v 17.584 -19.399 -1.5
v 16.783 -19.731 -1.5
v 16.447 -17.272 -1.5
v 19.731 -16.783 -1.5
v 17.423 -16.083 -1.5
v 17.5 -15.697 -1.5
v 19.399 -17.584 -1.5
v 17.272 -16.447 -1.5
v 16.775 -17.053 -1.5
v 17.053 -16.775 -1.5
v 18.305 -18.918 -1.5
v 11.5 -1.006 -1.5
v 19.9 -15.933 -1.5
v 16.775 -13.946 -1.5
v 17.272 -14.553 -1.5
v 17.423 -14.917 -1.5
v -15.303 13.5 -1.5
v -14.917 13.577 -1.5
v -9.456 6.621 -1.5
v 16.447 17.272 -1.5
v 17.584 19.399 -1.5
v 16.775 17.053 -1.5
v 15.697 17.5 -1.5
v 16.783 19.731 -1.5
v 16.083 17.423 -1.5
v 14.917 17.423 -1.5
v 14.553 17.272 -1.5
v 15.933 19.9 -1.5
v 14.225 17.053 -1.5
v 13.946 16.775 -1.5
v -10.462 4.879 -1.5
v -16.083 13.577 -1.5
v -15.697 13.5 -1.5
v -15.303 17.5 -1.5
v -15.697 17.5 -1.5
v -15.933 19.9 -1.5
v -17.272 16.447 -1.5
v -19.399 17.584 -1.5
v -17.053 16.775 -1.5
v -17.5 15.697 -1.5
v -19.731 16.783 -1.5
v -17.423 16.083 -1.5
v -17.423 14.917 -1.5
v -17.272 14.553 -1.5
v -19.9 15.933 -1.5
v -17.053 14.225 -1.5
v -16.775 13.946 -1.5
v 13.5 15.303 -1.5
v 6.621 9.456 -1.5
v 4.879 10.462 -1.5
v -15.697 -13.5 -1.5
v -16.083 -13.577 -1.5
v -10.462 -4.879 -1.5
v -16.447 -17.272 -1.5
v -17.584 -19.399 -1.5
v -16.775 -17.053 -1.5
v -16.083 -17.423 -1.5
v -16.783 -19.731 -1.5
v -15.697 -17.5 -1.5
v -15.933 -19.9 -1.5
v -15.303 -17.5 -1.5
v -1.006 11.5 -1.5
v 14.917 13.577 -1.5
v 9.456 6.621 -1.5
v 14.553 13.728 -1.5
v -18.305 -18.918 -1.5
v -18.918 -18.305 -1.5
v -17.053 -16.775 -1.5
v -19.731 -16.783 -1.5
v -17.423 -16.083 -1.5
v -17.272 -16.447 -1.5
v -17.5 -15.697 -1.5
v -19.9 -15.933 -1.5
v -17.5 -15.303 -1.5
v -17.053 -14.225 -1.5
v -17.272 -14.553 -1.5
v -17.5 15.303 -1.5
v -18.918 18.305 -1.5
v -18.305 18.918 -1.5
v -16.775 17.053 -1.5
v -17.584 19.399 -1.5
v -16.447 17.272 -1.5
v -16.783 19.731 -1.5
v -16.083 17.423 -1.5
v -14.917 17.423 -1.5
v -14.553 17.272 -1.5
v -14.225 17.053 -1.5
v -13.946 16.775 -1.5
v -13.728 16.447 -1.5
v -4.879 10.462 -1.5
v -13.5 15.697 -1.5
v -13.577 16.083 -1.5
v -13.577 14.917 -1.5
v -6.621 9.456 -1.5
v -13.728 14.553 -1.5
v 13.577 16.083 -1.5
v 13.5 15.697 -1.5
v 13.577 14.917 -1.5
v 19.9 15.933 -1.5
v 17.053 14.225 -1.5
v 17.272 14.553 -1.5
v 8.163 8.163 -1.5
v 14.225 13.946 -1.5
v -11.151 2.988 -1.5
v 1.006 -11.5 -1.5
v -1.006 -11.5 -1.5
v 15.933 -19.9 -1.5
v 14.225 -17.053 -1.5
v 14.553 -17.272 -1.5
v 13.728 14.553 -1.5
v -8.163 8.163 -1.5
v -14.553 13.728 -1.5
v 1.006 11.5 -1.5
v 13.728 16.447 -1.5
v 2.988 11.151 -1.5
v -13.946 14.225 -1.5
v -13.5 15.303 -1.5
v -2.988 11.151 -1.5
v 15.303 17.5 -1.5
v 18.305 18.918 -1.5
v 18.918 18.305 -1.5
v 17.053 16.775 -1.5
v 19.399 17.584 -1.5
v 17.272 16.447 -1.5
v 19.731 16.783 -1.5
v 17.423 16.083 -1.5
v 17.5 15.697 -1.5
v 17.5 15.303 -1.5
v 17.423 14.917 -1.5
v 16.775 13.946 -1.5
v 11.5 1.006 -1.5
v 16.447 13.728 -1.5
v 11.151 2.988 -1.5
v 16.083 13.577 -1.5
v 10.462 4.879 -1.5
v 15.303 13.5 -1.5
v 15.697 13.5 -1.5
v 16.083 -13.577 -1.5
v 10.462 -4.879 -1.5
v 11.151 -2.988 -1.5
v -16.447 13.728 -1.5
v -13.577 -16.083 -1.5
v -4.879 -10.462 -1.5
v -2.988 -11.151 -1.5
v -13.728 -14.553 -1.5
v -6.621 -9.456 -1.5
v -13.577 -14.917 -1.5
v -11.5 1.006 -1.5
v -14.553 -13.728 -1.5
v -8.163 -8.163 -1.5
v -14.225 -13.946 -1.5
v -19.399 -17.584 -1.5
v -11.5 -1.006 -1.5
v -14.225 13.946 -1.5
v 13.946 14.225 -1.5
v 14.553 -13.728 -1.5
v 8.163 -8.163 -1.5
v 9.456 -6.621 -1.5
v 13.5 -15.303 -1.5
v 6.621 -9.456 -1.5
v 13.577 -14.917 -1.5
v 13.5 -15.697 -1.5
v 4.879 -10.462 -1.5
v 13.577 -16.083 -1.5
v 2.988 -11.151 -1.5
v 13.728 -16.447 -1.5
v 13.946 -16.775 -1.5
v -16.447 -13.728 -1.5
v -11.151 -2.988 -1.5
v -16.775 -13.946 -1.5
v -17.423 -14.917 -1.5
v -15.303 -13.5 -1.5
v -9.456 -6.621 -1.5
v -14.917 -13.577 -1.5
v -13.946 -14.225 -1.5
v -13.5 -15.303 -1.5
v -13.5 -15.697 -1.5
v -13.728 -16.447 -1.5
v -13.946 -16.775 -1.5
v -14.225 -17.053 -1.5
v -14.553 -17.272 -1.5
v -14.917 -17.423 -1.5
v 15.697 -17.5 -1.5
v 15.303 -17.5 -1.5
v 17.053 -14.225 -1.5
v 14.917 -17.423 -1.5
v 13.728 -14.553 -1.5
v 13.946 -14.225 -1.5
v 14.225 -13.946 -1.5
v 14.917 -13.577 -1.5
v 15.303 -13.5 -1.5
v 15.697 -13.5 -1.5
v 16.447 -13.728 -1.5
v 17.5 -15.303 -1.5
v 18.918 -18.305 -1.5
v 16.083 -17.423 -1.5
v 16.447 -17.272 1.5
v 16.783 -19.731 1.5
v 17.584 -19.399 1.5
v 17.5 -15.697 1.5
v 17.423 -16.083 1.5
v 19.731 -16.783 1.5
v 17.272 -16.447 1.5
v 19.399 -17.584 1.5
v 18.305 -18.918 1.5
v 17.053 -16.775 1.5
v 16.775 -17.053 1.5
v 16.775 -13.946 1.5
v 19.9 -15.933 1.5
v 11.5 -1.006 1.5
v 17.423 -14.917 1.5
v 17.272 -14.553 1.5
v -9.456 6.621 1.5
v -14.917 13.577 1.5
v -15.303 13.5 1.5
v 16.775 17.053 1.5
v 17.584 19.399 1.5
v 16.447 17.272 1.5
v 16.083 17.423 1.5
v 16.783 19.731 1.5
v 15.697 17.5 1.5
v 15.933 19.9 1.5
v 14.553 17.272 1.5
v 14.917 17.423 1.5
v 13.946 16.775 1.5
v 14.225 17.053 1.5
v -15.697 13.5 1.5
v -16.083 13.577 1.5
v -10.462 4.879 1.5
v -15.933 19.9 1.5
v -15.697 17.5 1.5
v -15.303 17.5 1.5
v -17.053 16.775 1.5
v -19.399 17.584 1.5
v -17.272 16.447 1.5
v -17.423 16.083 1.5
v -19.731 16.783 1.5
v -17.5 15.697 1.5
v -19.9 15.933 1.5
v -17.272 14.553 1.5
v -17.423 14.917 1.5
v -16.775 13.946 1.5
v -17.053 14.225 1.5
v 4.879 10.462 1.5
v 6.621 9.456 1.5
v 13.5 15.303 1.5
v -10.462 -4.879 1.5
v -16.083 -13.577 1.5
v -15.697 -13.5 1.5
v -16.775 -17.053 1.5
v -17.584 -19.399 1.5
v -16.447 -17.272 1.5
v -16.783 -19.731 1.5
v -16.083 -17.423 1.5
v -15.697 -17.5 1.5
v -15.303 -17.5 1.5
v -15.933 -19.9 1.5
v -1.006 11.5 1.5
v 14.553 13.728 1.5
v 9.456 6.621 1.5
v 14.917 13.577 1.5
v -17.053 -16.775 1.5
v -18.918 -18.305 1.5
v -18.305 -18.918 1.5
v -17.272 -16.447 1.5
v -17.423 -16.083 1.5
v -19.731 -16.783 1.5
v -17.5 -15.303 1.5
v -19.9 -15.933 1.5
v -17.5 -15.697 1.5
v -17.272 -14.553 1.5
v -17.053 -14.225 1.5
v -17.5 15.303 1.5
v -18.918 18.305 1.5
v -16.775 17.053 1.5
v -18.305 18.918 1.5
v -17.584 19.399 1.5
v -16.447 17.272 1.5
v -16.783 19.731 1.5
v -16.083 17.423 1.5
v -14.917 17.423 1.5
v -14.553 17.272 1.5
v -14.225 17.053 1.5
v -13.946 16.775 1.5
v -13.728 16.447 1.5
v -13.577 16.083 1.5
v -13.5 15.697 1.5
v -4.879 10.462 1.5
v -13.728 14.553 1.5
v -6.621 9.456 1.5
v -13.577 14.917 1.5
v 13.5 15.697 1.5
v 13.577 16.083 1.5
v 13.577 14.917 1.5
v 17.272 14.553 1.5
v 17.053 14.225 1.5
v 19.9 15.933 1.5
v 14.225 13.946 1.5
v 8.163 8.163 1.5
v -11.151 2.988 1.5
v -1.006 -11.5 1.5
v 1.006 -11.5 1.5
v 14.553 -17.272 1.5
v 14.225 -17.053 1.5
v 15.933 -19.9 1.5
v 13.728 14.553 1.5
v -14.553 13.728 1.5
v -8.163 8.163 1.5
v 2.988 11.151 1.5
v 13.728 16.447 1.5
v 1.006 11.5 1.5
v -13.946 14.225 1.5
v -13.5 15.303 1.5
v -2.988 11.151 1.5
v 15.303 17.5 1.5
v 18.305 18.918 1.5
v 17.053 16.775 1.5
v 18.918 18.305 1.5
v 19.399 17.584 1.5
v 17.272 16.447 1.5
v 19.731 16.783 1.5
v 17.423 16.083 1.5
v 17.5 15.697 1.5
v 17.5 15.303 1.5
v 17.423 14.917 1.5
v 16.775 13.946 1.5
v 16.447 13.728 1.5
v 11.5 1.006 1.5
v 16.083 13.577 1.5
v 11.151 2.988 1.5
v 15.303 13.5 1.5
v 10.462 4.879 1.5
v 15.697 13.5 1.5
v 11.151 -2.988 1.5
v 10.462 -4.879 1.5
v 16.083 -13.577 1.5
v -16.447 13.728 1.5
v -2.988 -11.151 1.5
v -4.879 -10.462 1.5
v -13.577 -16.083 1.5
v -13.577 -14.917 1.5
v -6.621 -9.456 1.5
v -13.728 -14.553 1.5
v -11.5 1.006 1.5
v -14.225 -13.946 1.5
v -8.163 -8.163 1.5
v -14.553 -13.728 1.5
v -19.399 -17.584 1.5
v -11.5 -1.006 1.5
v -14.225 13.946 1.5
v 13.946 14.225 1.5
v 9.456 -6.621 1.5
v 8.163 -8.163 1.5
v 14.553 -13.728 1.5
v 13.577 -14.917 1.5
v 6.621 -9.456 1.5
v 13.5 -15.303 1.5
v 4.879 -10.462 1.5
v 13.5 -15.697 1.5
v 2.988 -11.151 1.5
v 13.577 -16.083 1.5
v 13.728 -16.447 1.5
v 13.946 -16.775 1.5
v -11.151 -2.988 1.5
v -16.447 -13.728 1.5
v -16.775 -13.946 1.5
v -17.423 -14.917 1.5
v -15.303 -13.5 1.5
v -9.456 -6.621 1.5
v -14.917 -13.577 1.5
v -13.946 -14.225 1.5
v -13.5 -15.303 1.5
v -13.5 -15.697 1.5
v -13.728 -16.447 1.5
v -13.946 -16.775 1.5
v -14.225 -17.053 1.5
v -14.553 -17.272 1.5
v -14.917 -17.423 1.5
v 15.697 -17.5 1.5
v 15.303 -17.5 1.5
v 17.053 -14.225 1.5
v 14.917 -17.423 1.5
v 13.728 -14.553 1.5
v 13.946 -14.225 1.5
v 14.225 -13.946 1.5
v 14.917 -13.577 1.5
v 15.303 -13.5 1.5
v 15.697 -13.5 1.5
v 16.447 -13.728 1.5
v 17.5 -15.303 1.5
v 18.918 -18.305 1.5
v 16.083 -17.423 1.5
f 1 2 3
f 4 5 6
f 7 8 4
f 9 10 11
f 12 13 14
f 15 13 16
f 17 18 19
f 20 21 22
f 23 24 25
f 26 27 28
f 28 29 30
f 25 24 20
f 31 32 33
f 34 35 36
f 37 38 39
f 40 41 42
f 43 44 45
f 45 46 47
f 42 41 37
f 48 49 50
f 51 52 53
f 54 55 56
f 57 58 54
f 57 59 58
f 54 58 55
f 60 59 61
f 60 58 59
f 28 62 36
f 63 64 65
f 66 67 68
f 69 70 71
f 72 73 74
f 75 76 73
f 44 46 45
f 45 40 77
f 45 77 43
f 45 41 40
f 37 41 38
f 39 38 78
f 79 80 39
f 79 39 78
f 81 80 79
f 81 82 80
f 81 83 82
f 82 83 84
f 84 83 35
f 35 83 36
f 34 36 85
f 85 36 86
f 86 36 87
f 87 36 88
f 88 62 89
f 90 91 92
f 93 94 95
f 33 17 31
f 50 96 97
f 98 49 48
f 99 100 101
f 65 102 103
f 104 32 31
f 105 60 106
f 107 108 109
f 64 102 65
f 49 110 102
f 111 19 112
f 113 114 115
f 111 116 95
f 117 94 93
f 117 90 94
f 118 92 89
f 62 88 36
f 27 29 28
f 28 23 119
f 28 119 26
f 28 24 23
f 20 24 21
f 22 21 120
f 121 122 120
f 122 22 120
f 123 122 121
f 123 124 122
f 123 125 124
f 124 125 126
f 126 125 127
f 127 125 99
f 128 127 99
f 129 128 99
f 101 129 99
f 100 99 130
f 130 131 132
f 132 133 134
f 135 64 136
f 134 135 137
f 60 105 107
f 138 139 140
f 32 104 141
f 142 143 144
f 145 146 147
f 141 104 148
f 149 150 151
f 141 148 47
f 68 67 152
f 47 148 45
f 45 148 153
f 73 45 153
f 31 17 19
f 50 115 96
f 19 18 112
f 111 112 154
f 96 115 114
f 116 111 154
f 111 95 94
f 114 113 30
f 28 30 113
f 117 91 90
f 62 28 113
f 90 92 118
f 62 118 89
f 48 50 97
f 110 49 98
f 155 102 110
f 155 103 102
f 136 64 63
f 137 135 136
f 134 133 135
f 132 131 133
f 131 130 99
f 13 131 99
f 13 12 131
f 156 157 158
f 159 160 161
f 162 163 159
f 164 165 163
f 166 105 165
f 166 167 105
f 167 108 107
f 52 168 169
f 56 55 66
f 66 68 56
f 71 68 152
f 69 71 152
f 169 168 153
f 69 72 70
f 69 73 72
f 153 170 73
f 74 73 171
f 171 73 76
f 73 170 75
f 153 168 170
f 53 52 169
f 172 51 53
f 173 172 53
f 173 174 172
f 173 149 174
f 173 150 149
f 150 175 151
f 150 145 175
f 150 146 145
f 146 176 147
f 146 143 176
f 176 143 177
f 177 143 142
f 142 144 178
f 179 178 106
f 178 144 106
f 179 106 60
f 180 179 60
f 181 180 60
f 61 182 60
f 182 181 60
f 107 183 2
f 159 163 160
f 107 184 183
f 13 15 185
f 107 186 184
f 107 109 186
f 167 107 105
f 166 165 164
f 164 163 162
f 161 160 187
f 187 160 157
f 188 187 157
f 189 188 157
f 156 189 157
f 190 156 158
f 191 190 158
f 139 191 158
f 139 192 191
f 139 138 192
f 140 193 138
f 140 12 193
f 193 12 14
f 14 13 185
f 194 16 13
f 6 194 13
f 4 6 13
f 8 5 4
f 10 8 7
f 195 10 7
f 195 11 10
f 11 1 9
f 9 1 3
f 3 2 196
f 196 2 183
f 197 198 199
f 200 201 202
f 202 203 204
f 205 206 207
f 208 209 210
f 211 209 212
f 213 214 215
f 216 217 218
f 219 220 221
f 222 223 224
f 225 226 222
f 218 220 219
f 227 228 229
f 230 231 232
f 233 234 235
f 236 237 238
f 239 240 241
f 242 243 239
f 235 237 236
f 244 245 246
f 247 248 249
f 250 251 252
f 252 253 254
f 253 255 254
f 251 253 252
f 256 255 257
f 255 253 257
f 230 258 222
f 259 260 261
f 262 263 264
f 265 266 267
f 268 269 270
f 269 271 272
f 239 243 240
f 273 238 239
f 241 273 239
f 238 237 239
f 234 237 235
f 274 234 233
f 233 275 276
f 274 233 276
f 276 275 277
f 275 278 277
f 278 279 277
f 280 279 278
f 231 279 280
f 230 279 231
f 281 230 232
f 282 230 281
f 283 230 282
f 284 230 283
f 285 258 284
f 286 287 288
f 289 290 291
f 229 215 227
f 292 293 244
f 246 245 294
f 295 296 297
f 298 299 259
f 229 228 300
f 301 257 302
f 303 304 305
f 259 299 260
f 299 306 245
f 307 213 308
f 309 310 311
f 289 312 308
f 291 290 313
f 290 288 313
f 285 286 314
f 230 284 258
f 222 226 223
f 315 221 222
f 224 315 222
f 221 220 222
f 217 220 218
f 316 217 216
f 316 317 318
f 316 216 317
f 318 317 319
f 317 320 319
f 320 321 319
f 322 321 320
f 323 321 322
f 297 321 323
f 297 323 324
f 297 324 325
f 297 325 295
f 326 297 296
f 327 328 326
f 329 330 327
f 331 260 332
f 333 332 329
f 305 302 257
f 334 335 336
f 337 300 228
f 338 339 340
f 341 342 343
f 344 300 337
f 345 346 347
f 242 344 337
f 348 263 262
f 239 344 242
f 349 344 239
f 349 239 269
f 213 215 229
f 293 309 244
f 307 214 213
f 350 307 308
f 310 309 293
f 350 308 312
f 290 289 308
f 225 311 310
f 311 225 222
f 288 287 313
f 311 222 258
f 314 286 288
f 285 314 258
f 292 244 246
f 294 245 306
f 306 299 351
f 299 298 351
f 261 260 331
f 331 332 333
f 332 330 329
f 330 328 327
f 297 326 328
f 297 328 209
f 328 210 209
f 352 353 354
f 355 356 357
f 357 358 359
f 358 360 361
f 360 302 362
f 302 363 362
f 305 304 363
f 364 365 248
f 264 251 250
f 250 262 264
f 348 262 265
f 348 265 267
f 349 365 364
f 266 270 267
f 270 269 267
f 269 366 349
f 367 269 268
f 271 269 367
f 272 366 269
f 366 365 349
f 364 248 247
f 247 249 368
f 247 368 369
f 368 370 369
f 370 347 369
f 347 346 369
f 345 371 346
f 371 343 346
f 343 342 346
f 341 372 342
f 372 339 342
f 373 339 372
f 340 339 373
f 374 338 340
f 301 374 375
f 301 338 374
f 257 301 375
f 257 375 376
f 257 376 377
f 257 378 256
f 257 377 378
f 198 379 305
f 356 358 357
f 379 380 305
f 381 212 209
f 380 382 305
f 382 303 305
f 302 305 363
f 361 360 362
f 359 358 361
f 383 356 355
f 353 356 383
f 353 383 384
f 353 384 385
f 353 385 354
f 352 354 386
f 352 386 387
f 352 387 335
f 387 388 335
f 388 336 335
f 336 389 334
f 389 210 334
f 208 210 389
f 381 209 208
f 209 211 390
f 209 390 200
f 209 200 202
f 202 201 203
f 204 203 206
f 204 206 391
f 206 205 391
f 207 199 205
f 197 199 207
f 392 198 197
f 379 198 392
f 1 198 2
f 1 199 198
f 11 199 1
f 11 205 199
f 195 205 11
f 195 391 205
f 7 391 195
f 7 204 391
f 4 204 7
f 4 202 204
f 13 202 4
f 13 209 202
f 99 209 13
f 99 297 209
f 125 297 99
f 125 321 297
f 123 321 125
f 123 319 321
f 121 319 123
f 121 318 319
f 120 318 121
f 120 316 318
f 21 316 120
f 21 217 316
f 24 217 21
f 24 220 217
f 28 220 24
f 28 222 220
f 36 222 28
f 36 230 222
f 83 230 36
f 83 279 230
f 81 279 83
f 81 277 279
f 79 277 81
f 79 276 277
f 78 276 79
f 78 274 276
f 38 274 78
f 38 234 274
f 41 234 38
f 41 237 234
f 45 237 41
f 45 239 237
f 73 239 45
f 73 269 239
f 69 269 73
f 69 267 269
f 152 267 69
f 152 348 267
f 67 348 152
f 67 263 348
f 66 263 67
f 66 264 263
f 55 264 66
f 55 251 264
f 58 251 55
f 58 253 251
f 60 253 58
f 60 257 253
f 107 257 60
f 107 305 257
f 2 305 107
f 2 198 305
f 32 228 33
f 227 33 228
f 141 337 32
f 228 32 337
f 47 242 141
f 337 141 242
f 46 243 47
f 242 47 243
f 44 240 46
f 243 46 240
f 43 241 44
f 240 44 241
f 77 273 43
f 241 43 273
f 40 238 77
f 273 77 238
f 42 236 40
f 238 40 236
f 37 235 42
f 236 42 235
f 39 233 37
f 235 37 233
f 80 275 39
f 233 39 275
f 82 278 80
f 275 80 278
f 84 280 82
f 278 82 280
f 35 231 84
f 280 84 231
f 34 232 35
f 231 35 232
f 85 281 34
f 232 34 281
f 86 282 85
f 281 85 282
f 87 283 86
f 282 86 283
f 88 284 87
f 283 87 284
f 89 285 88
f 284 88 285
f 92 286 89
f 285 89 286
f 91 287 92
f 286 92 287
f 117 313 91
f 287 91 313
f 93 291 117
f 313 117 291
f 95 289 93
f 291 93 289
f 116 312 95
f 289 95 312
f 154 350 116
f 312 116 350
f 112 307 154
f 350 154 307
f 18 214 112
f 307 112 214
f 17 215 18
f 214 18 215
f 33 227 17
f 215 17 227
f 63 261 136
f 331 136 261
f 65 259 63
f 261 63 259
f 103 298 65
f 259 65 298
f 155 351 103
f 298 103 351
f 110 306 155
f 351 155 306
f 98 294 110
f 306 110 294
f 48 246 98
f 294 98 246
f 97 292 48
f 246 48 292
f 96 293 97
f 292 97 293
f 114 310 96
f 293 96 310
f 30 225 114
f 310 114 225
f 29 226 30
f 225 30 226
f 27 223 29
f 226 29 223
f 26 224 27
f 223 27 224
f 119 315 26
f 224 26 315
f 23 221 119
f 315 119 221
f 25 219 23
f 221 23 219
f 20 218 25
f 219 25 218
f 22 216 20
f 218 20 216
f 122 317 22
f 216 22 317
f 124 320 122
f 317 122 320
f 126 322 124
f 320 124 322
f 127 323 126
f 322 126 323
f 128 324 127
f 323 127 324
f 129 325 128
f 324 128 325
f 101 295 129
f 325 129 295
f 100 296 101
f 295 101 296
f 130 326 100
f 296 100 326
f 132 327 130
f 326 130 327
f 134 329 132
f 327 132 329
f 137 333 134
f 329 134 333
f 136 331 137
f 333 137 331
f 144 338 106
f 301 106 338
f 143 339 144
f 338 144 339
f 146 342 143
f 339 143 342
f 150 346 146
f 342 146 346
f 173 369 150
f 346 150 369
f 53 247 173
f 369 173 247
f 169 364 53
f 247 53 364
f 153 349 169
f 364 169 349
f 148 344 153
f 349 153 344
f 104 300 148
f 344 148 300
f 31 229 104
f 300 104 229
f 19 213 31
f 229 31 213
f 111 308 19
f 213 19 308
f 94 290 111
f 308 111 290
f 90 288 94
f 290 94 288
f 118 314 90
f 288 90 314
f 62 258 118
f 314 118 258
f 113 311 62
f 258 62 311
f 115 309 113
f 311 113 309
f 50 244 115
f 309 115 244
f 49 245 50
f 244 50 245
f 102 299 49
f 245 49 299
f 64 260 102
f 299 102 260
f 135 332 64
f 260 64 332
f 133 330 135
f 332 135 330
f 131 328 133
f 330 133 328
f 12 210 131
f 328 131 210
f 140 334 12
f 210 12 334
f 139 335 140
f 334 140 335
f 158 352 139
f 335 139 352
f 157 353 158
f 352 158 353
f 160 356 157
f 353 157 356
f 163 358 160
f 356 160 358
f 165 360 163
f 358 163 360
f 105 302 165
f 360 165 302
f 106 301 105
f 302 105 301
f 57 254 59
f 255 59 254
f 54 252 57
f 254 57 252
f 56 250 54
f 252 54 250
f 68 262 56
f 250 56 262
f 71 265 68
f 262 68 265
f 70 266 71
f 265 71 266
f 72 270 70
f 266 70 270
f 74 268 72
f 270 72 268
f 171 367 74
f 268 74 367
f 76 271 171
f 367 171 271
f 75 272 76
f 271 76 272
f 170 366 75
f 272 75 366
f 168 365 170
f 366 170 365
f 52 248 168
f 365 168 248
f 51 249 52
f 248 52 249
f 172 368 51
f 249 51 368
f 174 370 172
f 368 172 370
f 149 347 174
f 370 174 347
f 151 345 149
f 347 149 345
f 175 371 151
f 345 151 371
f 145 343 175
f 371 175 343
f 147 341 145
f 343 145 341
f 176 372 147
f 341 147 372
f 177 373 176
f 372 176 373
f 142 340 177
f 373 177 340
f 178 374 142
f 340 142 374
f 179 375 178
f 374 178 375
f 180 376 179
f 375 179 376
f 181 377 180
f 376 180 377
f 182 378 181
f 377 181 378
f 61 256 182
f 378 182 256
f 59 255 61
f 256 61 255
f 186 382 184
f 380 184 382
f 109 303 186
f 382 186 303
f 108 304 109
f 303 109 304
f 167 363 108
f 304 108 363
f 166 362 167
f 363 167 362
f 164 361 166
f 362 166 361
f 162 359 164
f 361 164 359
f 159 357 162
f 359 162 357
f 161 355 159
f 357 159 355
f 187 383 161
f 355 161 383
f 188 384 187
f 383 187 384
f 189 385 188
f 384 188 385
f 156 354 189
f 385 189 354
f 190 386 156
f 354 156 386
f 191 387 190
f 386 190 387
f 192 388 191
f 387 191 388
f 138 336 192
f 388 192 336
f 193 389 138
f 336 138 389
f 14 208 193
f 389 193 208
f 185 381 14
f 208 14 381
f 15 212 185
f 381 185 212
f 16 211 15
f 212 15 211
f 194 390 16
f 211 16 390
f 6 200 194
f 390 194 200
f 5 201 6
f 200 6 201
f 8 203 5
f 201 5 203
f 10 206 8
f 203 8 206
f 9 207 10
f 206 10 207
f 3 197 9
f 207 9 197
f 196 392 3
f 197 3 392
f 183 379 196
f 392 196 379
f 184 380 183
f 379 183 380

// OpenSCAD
// file: lib/util.scad
resolution = 32;

left = -1;
right = 1;
top = 1;
bottom = -1;
rear = 1;
front = -1;

function accurate_diam(diam,sides) = 1 / cos(180/sides) / 2 * diam;

module hole(diam,len,sides=8) {
  rotate([0,0,180/sides]) {
    cylinder(r=accurate_diam(diam,sides),h=len,center=true,$fn=sides);
  }
}

module accurate_circle(diam,sides=8) {
  rotate([0,0,180/sides]) {
    circle(r=accurate_diam(diam,sides),$fn=sides);
  }
}

module debug_axes() {
  color("red") translate([50,0,0]) cube([100,.2,.2],center=true);
  color("green") translate([0,50,0]) cube([.2,100,.2],center=true);
  color("blue") translate([0,0,50]) cube([.2,.2,100],center=true);
}

module ring(id,thickness,height,fn=16) {
  od = id + thickness;
  linear_extrude(height=height,center=true) {
    difference() {
      accurate_circle(od,fn);
      accurate_circle(id,fn);
    }
  }
}

module rounded_square(width,depth,diam,fn=resolution) {
  pos_x = width/2-diam/2;
  pos_y = depth/2-diam/2;

  hull() {
    for(x=[left,right]) {
      for(y=[front,rear]) {
        translate([x*pos_x,y*pos_y,0]) {
          accurate_circle(diam,fn);
        }
      }
    }
  }
}

module rounded_cube(width,depth,height,diam,fn=resolution) {
  linear_extrude(height=height,center=true,convexity=3) {
    rounded_square(width,depth,diam,fn);
  }
}

module round_corner_filler(diam,length) {
  linear_extrude(height=length,center=true,convexity=3) {
    round_corner_filler_profile(diam);
  }
}

module round_corner_filler_profile(diam,res=resolution) {
  difference() {
    translate([diam/4,diam/4,0]) {
      square([diam/2,diam/2],center=true);
    }
    translate([diam/2,diam/2,0]) {
      accurate_circle(diam,res);
    }
  }
}

module space_along_length(length,min_hole_spacing=4*inch,from_end=1*inch) {
  avail_length = length - (from_end*2);
  num_spaces   = floor(avail_length / min_hole_spacing);
  extra_space  = (avail_length - (num_spaces*min_hole_spacing)) / num_spaces;
  spacing      = min_hole_spacing + extra_space;

  // echo(length, num_spaces, spacing);

  translate([0,-length/2+from_end,0]) {
    for(y=[0:num_spaces]) {
      translate([0,y*spacing,0]) {
        children();
      }
    }
  }
}

module letter_spike(thin_width,thick_width,thickness) {
  hull() {
    cylinder(r=thin_width,h=thickness*2,center=true,$fn=16);
    cylinder(r=thick_width,h=0.01,center=true,$fn=16);
  }
}

module letter_L(width=10,height=20,thickness=0.5,thick_width=2,thin_width=0.3) {
  lines = [
    [
      [-width/2,height/2,0],
      [-width/2,-height/2,0],
    ],
    [
      [-width/2,-height/2,0],
      [width/2,-height/2,0],
    ],
  ];

  for(pair=lines) {
    hull() {
      for(vect=pair) {
        translate(vect) {
          letter_spike(thin_width,thick_width,thickness);
        }
      }
    }
  }
}

module letter_R(width=10,height=20,thickness=0.5,thick_width=2,thin_width=0.3) {
  lines = [
    [
      [-width/2,height/2,0],
      [-width/2,-height/2,0],
    ],
    [
      [-width/2,height/2,0],
      [width/2,height/3,0],
    ],
    [
      [width/2,height/3,0],
      [-width/4,0,0],
    ],
    [
      [-width/2,0,0],
      [-width/4,0,0],
    ],
    [
      [-width/4,0,0],
      [width/2,-height/2,0],
    ],
  ];

  for(pair=lines) {
    hull() {
      for(vect=pair) {
        translate(vect) {
          letter_spike(thin_width,thick_width,thickness);
        }
      }
    }
  }
}

module zip_tie_cavity(inner_diam_input,zip_tie_thickness,zip_tie_width,fn=resolution) {
  inner_diam = inner_diam_input -0.05;
  overall_width = inner_diam+zip_tie_thickness*2;

  module profile() {
    for(x=[left,right]) {
      translate([x*(inner_diam/2+zip_tie_thickness/2),overall_width,0]) {
        square([zip_tie_thickness,overall_width*2],center=true);
      }
    }

    intersection() {
      translate([0,-overall_width,0]) {
        square([overall_width*2,overall_width*2],center=true);
      }
      difference() {
        accurate_circle(inner_diam+zip_tie_thickness*2,fn);
        accurate_circle(inner_diam,fn);
      }
    }
  }

  linear_extrude(height=zip_tie_width,convexity=3,center=true) {
    profile();
  }
}

module printed_extrusion_carriage_profile(body_width,body_height) {
  spring_thickness = extrude_width*4;
  spring_gap_width = 1;
  preload = -0.2; // negative makes more slack both for print and UHMWPE tape
  wall_thickness = extrude_width*4;

  cavity_width = body_width - wall_thickness*4;
  cavity_height = body_height - wall_thickness*4;

  module spring_profile() {
    contact_width = 8;

    translate([0,-preload+spring_thickness/2]) {
      translate([left*(y_rail_extrusion_width/2-contact_width/2),0,0]) {
        rounded_square(contact_width,spring_thickness,spring_thickness);
      }
      hull() {
        translate([left*(y_rail_extrusion_width/2-contact_width+spring_thickness/2),0,0]) {
          accurate_circle(spring_thickness,resolution);
        }
        translate([right*(y_rail_extrusion_width/2-spring_thickness),spring_gap_width/2,0]) {
          accurate_circle(spring_thickness,resolution);
        }
      }
      translate([right*(y_rail_extrusion_width/2-spring_thickness),2-spring_thickness/2+spring_gap_width/2,0]) {
        rounded_square(spring_thickness,4,spring_thickness);
      }
    }
  }

  for(z=[top,bottom]) {
    mirror([0,1-z,0]) {
      translate([0,y_rail_extrusion_height/2]) {
        spring_profile();
      }

      for(x=[left,right]) {
        mirror([1-x,0,0]) {
          translate([y_rail_extrusion_width/2,y_rail_extrusion_height/4,0]) {
            rotate([0,0,-90]) {
              spring_profile();
            }
          }
        }
      }
    }
  }

  difference() {
    gap_width = cavity_height - y_rail_extrusion_height;
    rounded_square(body_width,body_height,wall_thickness*8);
    rounded_square(cavity_width,cavity_height,gap_width);
  }
}

/*
translate([-10,0,0]) {
  letter_L();
}

translate([10,0,0]) {
  letter_R();
}
*/
// file: config.scad
include <./lib/util.scad>;
include <./lib/vitamins.scad>;

extrude_width = 0.4;
wall_thickness = extrude_width*3;
// main file
include <./config.scad>;
include <./lib/util.scad>;

module bmg_spacer() {
  thickness = 3; // the mount that Bondtech sells is 3mm, so...
  screw_hole_diam = nema17_screw_diam+1;
  rounded_diam = screw_hole_diam + wall_thickness*4;

  module profile() {
    module body() {
      hull() {
        for(x=[left,right]) {
          for(y=[front,rear]) {
            translate([x*nema17_hole_spacing/2,y*nema17_hole_spacing/2]) {
              accurate_circle(rounded_diam,resolution);
            }
          }
        }
      }
    }

    module holes() {
      accurate_circle(nema17_shoulder_diam+1,36);

      for(x=[left,right]) {
        for(y=[front,rear]) {
          translate([x*nema17_hole_spacing/2,y*nema17_hole_spacing/2]) {
            accurate_circle(nema17_screw_diam+1,resolution);
          }
        }
      }
    }

    difference() {
      body();
      holes();
    }
  }

  linear_extrude(height=thickness,center=true,convexity=3) {
    profile();
  }
}

bmg_spacer();
